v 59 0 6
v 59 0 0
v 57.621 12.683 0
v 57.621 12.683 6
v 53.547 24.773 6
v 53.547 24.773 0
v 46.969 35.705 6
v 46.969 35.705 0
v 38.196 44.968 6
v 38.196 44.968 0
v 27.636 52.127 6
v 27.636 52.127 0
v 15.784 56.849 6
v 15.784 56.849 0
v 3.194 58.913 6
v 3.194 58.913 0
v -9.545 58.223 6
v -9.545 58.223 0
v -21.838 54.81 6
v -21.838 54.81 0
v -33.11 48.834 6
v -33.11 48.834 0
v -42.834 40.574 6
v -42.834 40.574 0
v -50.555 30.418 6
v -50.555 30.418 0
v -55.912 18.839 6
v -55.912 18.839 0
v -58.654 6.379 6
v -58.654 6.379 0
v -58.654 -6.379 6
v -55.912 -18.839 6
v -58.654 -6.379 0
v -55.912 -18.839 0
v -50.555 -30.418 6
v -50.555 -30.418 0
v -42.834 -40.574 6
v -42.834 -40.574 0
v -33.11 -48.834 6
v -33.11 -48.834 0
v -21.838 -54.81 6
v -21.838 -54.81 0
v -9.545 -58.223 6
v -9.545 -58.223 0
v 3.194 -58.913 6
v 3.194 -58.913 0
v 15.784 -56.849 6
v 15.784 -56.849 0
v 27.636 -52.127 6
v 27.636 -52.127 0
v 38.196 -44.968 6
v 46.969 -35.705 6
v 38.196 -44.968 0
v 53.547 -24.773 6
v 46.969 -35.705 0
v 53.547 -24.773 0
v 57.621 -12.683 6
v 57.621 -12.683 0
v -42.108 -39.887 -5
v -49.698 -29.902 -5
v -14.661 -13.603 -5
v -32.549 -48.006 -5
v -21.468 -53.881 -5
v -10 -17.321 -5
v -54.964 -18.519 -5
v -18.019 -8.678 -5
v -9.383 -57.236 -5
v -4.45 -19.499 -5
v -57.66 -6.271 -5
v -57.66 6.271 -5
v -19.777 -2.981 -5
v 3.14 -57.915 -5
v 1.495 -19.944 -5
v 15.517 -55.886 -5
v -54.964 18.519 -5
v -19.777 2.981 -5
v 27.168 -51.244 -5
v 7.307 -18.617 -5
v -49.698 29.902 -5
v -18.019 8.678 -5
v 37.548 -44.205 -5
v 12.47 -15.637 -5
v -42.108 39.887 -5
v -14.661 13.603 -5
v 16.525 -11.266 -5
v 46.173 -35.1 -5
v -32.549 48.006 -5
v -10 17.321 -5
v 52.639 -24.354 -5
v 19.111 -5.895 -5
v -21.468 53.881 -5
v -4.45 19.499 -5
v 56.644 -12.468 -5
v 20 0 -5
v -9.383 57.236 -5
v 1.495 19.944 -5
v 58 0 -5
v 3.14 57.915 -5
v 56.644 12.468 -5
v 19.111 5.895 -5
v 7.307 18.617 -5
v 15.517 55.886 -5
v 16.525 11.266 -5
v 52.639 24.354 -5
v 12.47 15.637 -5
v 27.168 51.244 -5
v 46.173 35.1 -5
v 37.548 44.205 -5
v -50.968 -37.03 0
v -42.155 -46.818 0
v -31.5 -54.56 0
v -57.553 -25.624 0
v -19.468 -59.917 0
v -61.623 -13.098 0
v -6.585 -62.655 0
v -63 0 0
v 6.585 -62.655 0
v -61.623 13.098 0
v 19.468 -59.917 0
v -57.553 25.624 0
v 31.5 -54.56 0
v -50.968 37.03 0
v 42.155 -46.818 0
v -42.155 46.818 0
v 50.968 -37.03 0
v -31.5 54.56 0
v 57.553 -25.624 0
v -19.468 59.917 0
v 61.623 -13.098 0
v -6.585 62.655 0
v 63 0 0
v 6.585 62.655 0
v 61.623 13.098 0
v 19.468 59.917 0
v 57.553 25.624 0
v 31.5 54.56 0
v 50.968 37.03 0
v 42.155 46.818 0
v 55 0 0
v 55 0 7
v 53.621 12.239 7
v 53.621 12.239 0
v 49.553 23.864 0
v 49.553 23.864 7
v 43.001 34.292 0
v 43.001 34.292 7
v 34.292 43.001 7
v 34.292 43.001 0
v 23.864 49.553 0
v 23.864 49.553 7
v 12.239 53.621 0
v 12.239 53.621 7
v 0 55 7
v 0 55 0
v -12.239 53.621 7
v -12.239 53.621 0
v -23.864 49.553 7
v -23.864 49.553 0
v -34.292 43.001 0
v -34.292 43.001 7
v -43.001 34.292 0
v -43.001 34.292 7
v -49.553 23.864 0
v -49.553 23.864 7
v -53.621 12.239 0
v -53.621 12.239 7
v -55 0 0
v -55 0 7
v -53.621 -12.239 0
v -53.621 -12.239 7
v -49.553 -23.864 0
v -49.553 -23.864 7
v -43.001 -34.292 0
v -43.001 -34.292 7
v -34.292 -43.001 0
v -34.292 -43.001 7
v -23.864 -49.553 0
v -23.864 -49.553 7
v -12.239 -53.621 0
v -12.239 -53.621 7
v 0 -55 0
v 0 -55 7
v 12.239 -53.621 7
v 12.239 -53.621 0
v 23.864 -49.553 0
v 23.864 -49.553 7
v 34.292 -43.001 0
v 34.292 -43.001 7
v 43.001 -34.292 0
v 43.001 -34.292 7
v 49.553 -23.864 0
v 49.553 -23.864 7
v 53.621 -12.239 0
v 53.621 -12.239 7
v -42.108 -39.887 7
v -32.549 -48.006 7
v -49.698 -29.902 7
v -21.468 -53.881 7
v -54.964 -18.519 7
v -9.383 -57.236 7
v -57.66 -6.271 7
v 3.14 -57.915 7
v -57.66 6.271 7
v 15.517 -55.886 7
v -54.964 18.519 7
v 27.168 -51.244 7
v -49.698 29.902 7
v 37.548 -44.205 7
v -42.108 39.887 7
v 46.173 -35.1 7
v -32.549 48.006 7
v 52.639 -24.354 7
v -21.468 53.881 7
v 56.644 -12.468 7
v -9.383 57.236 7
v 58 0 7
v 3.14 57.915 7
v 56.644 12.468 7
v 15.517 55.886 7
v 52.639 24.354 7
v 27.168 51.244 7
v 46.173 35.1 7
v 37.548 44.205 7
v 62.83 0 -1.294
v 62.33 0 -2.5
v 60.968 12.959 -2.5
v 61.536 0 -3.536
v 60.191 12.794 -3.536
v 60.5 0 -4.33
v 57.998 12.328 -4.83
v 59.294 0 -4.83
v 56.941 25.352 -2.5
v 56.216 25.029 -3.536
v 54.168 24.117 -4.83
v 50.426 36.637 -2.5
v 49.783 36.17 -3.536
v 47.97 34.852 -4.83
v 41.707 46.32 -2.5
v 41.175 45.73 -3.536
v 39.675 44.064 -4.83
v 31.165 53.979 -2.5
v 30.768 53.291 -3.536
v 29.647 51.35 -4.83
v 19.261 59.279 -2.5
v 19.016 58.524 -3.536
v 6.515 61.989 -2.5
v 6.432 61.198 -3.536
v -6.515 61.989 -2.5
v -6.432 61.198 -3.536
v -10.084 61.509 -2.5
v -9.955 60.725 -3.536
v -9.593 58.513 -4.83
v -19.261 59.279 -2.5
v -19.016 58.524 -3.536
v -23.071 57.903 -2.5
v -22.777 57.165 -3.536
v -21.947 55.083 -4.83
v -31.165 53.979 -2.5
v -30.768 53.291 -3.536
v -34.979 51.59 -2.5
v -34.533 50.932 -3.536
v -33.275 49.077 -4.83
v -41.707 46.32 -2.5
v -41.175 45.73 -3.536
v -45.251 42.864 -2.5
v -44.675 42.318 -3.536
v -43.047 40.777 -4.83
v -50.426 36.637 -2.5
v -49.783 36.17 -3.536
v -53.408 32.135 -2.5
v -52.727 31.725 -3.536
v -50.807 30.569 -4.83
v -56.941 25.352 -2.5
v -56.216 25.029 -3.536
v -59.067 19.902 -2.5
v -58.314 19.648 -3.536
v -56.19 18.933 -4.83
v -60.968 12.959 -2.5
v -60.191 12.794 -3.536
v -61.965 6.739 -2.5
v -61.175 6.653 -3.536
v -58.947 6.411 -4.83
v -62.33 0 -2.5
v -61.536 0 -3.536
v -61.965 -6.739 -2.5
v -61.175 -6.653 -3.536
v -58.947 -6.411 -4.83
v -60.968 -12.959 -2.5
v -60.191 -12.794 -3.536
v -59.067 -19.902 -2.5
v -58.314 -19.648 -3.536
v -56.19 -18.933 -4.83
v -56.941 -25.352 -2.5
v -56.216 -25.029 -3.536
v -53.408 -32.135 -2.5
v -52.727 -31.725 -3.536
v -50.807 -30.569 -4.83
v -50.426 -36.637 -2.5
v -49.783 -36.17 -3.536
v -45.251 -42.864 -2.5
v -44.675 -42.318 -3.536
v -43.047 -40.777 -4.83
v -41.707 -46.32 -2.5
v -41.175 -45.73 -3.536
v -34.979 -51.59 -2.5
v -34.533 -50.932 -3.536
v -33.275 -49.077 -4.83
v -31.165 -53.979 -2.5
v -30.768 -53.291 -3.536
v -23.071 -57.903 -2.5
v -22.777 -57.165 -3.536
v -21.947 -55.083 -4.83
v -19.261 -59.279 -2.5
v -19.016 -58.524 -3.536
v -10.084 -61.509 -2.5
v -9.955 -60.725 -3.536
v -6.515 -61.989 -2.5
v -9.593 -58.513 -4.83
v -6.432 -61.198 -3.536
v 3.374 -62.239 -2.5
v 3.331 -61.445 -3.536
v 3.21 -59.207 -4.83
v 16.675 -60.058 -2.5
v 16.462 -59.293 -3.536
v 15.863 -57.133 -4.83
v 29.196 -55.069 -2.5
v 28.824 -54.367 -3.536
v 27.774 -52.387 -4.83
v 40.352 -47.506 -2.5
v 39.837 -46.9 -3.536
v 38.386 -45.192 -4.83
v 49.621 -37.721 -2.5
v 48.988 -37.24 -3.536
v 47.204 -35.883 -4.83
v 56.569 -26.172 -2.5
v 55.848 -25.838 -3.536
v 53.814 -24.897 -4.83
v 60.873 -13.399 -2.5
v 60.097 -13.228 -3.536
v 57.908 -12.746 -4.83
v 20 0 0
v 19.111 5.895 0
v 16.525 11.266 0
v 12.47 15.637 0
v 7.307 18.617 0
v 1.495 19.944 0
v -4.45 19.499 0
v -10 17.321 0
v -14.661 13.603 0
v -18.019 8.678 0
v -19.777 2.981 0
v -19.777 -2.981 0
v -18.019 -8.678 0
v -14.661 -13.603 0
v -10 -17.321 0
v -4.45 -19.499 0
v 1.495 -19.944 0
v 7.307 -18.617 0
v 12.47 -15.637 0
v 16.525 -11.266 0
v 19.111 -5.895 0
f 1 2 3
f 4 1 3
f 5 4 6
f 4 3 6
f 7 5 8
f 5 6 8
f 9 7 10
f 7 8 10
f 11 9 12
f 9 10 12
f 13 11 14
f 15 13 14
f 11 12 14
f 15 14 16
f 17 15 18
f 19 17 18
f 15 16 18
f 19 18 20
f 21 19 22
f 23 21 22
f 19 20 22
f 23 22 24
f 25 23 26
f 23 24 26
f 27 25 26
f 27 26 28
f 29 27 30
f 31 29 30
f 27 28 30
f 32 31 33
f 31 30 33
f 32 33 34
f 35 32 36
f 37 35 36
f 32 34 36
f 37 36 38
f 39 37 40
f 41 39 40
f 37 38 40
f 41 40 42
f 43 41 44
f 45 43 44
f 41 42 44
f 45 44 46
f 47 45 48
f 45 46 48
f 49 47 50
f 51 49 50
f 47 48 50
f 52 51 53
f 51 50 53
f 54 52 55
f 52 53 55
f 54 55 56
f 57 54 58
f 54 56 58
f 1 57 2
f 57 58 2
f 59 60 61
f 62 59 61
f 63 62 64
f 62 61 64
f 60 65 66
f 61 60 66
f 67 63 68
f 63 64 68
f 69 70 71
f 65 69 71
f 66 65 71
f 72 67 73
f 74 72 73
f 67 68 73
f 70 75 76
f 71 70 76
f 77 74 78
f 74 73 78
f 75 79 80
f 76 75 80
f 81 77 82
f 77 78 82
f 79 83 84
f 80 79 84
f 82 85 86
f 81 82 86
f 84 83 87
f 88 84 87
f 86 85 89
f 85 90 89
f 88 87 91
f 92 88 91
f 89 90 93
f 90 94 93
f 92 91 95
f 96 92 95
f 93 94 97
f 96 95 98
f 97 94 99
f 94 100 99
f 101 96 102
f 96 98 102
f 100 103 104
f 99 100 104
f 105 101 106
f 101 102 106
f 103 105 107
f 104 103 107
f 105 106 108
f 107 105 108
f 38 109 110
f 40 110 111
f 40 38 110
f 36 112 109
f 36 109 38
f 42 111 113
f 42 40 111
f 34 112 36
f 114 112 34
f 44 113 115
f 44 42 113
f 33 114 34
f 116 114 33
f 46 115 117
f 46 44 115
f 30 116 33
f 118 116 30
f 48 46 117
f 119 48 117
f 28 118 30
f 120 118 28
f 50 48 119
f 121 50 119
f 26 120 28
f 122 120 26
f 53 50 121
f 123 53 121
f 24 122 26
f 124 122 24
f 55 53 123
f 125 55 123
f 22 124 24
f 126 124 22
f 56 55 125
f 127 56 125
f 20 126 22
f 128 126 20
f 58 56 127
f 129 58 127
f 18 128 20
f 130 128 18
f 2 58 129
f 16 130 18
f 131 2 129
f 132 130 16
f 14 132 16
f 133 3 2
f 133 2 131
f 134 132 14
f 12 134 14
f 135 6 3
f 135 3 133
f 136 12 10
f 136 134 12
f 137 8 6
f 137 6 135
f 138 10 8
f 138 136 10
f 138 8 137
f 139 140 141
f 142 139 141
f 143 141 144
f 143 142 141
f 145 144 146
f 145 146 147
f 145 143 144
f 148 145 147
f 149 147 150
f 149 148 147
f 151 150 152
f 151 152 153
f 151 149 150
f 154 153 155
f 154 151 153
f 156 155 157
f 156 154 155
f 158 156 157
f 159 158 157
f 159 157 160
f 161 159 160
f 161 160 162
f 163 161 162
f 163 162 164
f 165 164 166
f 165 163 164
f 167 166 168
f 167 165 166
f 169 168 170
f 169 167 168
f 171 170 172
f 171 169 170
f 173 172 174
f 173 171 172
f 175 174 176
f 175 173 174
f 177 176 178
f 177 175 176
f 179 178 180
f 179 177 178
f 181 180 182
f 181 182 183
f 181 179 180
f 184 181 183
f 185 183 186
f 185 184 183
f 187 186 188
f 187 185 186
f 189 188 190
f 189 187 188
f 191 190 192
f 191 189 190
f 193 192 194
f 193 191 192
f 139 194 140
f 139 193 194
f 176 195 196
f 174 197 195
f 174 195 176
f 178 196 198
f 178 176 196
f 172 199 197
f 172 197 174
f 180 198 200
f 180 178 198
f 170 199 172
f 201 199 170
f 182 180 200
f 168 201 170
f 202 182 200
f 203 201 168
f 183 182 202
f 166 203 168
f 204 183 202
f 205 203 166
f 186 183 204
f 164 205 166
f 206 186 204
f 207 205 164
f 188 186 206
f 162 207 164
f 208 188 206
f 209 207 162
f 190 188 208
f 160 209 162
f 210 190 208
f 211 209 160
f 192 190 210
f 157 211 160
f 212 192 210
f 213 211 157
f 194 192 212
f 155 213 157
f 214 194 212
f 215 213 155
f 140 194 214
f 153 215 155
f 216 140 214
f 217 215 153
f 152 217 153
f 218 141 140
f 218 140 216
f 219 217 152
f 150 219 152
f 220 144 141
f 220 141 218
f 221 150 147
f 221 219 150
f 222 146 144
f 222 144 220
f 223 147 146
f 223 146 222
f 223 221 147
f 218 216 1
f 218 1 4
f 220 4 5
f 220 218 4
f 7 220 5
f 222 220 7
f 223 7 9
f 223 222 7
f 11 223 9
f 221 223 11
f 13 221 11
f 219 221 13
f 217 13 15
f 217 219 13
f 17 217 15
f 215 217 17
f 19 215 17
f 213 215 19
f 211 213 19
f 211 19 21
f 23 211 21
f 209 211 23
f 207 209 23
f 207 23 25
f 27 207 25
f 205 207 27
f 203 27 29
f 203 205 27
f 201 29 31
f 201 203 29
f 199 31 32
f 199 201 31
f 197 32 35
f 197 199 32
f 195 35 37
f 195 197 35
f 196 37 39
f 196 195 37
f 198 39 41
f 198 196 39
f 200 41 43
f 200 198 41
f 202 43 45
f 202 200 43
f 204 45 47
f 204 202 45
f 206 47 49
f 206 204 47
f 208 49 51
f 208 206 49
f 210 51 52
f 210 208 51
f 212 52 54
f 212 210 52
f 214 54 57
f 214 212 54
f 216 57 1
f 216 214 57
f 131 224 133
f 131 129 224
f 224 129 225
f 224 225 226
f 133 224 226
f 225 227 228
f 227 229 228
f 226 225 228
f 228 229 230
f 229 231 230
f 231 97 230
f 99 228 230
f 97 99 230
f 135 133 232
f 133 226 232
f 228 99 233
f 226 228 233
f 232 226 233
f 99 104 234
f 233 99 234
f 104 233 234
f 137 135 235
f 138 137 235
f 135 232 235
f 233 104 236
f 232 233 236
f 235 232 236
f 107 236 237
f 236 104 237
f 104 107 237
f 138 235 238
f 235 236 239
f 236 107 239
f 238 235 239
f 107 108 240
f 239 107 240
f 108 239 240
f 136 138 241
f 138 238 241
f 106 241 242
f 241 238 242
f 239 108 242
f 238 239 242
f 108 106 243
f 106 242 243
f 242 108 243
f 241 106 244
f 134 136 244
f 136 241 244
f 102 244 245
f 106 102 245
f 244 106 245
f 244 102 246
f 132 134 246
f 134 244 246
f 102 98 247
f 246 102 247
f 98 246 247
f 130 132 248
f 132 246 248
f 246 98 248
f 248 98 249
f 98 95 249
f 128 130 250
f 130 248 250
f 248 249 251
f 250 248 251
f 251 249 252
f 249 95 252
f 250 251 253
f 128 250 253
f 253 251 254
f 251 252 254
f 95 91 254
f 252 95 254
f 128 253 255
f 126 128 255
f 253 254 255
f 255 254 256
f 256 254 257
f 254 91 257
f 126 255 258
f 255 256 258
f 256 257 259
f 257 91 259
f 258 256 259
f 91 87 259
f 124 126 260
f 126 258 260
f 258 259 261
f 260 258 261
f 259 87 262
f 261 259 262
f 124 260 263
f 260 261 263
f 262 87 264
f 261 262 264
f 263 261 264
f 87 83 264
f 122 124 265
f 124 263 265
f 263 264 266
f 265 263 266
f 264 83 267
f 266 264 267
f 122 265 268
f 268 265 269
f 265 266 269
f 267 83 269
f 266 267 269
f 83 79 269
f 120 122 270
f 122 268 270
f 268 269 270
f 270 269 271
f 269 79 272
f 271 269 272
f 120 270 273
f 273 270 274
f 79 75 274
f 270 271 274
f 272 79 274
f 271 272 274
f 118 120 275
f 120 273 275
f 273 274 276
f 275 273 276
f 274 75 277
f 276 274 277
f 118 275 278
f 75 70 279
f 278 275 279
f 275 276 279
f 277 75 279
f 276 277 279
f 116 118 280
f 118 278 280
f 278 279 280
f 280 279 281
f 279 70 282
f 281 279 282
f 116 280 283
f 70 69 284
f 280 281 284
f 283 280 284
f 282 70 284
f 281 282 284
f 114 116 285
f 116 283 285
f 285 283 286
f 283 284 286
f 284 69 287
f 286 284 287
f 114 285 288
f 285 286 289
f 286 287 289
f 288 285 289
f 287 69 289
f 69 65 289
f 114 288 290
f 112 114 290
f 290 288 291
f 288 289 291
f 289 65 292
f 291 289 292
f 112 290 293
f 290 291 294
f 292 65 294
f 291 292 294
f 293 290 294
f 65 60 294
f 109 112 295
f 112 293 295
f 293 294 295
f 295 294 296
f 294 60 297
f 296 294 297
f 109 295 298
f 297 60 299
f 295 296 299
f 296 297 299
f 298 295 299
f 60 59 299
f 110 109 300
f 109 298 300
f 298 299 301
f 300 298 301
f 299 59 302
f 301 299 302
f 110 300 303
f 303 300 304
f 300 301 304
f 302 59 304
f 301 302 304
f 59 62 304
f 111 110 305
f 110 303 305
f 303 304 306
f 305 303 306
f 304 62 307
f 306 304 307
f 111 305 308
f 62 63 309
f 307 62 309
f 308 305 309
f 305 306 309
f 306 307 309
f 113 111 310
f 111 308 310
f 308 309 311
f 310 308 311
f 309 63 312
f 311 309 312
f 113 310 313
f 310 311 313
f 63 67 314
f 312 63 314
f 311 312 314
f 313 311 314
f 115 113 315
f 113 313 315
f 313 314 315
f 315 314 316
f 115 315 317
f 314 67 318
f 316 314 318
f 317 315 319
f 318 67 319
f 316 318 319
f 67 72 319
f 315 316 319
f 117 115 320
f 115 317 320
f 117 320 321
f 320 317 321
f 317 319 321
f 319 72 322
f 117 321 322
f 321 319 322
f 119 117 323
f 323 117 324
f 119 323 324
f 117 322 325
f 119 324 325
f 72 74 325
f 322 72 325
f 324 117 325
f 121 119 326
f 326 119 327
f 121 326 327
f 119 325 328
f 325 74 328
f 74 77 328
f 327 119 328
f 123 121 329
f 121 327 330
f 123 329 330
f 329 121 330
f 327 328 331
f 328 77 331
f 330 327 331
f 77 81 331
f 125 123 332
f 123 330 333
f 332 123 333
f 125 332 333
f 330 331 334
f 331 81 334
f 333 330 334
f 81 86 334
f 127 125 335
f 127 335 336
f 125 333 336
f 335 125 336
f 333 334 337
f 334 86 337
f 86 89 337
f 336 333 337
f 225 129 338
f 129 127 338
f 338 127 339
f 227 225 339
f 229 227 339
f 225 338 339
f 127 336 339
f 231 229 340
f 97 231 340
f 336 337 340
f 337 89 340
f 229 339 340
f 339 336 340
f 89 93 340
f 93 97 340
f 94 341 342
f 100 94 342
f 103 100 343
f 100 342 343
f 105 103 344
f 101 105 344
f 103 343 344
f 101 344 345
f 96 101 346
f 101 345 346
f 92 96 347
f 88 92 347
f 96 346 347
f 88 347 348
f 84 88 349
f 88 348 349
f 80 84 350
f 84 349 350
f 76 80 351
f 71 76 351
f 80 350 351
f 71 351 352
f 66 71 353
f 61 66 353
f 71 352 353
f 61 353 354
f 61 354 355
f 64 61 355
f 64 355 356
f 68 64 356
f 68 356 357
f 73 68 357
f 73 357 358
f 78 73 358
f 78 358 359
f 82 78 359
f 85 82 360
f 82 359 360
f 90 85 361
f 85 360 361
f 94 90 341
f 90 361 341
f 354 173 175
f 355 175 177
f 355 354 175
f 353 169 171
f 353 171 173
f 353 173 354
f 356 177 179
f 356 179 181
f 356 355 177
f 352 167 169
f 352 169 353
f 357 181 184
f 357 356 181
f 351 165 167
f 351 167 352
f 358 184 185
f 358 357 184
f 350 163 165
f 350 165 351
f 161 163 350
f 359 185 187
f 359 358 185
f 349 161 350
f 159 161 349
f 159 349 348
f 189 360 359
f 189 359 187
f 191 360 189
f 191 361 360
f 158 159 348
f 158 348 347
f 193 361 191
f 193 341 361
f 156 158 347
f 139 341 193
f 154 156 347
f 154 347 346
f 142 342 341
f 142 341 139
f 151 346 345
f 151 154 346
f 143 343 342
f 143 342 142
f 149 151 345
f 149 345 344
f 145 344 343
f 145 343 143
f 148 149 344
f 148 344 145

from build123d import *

# Parameters (mm, degrees)
F0_R     = 59
F0_R_2   = 55
F1_DEPTH = 7
F0_R_3   = 63
F0_R_4   = 20
F2_DEPTH = 5
F3_R     = 4.99999
F4_SIZE  = 1


# Not quite as in the source:
# - a fillet or chamfer is up to 0.001 mm smaller than in the source, because OpenCascade refuses the exact size


with BuildPart() as f1:
    # F0 (on Top) → F1 (new body)
    with BuildSketch(Plane.XY):
        Circle(F0_R)
        Circle(F0_R_2, mode=Mode.SUBTRACT)
    extrude(amount=F1_DEPTH)

    # F0 (on Top) → F2 (join)
    with BuildSketch(Plane.XY):
        Circle(F0_R_3)
        Circle(F0_R, mode=Mode.SUBTRACT)
        Circle(F0_R)
        Circle(F0_R_2, mode=Mode.SUBTRACT)
        Circle(F0_R_2)
        Circle(F0_R_4, mode=Mode.SUBTRACT)
    extrude(amount=-F2_DEPTH)

    # F3 (radius 5 in the source; OpenCascade refuses exactly that, so slightly less here)
    f3_edges = [f1.edges().sort_by_distance(p)[0] for p in [
        (-63, 0, -5),
    ]]
    fillet(f3_edges, radius=F3_R)

    # F4
    f4_edges = [f1.edges().sort_by_distance(p)[0] for p in [
        (-59, 0, 7),
    ]]
    chamfer(f4_edges, length=F4_SIZE)


solid = f1.part
